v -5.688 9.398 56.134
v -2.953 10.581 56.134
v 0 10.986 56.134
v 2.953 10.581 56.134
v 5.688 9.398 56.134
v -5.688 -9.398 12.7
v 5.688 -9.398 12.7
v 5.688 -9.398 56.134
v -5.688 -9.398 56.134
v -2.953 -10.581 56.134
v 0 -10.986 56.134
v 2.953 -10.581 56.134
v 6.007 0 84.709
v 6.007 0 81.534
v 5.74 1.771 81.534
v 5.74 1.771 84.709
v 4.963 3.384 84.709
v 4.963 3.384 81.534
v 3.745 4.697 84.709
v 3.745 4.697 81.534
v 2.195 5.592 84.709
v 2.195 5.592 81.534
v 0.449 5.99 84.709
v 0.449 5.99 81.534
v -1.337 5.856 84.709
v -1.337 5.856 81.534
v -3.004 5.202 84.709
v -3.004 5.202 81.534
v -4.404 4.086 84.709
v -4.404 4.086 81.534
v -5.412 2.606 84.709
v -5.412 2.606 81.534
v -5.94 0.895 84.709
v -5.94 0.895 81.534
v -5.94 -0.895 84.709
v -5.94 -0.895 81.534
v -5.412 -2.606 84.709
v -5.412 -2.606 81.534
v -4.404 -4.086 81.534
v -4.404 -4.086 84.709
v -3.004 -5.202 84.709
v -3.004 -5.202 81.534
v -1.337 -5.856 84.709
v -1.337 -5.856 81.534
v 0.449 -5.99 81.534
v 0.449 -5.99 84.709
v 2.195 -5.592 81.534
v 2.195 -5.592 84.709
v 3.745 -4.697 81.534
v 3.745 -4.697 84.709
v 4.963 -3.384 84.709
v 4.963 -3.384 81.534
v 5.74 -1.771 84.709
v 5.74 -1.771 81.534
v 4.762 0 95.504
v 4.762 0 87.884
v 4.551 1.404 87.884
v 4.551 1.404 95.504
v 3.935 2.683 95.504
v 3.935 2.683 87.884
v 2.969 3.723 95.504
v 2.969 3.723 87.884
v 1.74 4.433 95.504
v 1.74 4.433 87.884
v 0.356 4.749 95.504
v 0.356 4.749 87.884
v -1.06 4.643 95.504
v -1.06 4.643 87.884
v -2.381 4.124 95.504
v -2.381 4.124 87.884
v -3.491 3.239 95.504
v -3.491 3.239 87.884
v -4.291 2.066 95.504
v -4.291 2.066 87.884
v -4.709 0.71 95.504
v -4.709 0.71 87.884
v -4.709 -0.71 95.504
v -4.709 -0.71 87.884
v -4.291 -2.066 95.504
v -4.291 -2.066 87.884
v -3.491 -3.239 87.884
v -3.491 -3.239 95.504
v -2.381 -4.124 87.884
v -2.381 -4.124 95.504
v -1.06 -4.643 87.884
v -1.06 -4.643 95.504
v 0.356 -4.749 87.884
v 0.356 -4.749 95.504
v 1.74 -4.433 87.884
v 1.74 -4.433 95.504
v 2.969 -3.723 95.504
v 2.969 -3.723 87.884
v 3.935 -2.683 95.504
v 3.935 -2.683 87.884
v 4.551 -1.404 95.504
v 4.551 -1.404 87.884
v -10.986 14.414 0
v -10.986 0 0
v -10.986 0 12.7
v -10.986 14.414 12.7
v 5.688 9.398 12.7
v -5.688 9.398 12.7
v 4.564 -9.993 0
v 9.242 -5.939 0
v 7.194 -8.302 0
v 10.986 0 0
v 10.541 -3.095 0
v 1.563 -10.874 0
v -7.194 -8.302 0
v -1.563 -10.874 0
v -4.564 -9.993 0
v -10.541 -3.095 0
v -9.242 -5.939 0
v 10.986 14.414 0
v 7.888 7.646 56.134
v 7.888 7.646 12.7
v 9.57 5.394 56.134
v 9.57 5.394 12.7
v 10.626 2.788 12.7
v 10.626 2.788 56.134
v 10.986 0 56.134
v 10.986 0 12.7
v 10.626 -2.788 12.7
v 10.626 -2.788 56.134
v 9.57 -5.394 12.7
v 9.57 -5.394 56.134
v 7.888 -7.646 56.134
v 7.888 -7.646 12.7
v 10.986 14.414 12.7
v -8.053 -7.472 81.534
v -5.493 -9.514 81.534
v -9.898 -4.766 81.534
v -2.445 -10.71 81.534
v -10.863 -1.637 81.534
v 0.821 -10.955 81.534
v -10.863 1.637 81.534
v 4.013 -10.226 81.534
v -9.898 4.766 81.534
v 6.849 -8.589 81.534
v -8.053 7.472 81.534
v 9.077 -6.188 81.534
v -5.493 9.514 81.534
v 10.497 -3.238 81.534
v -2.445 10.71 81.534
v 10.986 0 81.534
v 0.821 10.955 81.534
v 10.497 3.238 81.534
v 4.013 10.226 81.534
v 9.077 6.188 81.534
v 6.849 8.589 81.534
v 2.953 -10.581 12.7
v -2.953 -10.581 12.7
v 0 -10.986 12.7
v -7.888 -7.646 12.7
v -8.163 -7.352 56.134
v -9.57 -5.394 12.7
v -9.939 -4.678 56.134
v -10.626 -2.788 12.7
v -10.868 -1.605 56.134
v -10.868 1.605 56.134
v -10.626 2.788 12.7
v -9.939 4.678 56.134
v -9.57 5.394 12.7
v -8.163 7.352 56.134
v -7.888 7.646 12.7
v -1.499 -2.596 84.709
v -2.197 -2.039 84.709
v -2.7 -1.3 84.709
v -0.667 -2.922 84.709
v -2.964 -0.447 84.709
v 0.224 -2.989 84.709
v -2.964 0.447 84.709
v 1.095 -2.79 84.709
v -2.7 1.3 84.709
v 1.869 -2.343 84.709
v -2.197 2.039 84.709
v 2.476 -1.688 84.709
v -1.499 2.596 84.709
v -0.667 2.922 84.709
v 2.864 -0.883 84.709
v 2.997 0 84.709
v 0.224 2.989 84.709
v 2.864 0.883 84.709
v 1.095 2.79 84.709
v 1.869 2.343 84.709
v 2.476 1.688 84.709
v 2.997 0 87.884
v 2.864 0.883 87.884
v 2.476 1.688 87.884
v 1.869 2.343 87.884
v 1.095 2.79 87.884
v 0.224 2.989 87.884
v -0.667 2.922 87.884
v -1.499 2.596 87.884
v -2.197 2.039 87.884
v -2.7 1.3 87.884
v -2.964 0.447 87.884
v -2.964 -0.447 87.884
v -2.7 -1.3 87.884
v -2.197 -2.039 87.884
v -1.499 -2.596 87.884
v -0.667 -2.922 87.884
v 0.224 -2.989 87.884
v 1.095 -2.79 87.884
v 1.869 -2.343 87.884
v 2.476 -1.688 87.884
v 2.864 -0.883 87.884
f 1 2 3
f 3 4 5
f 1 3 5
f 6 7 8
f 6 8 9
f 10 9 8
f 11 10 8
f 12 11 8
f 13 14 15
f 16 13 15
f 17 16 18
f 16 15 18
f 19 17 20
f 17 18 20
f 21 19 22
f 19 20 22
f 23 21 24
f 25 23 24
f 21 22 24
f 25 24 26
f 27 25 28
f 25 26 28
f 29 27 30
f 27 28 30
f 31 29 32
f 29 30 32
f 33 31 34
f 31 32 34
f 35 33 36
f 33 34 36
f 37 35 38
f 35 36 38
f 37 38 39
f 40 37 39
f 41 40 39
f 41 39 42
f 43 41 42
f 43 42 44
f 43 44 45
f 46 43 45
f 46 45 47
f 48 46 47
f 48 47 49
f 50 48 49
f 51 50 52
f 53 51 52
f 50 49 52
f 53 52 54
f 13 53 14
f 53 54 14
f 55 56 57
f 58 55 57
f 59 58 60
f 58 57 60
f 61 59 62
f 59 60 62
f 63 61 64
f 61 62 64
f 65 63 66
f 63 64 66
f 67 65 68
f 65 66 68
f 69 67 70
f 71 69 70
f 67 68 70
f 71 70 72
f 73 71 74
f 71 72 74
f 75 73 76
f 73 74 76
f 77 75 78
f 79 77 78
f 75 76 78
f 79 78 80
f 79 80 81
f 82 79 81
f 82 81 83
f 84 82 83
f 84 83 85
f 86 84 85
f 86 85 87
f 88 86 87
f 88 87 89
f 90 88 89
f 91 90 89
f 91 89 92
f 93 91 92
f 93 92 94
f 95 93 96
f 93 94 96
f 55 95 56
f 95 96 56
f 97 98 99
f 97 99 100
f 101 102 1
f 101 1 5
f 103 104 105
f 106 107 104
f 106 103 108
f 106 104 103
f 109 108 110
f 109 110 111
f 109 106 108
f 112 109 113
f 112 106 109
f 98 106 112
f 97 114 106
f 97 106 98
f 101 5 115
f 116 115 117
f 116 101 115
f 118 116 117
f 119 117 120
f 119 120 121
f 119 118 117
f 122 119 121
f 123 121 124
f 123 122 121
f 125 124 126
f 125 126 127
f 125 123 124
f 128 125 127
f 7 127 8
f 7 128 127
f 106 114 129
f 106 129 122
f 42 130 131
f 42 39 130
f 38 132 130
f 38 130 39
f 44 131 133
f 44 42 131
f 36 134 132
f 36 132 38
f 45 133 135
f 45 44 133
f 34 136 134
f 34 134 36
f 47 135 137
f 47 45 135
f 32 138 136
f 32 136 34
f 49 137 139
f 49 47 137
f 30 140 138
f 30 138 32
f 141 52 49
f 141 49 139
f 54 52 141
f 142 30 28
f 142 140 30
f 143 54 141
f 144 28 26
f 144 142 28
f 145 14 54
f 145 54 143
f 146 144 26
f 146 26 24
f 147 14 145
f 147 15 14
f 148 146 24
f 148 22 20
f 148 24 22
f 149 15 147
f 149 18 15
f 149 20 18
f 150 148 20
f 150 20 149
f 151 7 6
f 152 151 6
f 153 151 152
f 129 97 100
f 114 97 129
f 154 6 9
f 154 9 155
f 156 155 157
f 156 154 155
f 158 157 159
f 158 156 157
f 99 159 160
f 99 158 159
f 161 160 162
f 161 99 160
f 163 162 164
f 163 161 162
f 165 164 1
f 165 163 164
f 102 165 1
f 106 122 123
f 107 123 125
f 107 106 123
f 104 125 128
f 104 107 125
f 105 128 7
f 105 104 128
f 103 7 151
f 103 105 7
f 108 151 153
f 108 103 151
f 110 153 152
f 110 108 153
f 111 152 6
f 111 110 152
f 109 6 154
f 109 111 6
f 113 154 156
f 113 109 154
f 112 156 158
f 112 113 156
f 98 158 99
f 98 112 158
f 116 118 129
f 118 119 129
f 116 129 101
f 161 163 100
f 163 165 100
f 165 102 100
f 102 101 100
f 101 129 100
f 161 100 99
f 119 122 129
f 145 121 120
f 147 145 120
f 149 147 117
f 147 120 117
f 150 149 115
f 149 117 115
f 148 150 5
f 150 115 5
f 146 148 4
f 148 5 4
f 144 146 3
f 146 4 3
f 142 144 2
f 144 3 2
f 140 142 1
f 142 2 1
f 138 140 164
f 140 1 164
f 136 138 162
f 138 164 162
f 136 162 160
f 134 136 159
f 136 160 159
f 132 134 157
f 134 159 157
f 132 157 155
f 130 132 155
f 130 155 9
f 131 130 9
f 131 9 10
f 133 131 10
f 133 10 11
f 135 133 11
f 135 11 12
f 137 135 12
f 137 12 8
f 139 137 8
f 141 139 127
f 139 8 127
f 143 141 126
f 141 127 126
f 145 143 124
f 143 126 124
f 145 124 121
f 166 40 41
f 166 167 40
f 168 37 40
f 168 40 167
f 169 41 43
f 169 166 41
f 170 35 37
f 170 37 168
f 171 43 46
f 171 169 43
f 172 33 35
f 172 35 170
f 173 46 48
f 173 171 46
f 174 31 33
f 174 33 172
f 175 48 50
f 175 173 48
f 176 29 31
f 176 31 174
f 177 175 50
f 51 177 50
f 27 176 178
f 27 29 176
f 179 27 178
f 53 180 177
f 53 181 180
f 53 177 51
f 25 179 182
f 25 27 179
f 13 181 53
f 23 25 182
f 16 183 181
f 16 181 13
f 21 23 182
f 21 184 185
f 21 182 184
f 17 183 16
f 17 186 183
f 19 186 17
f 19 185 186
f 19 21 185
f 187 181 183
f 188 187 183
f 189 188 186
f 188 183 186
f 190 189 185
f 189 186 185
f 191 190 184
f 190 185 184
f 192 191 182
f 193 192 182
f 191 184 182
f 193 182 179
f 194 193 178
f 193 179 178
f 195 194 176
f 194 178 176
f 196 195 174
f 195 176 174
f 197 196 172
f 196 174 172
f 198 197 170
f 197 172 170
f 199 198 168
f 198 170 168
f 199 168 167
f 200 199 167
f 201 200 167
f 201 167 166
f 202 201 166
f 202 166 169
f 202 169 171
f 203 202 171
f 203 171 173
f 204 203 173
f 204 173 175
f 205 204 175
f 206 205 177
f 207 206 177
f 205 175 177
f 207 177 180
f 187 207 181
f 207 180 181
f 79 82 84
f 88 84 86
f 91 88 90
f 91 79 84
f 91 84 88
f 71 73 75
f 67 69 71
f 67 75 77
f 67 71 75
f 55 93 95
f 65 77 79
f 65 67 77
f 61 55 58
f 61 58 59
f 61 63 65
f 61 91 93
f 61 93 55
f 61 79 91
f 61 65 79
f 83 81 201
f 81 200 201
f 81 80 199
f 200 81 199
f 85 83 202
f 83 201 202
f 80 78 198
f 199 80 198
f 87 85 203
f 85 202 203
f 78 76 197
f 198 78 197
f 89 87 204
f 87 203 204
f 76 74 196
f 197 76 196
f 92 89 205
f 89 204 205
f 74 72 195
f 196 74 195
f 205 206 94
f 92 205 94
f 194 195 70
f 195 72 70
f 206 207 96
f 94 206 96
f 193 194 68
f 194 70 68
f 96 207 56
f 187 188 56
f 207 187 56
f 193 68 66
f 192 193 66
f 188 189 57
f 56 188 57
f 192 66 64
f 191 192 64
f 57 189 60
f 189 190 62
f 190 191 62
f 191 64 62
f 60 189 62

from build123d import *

# Parameters (mm, degrees)
BOSS_EXTRUDE1_DEPTH = 12.7
BOSS_EXTRUDE2_DEPTH = 43.434
SKETCH3_R           = 10.9855
BOSS_EXTRUDE3_DEPTH = 25.4
SKETCH4_R           = 6.0071
BOSS_EXTRUDE4_DEPTH = 3.175
SKETCH5_R           = 2.9972
BOSS_EXTRUDE5_DEPTH = 3.175
SKETCH6_R           = 4.7625
BOSS_EXTRUDE6_DEPTH = 7.62


with BuildPart() as part:
    # Sketch1 → Boss-Extrude1 (new body)
    with BuildSketch(Plane.XY):
        with BuildLine():
            Line((-10.9855, 0), (-10.9855, 14.4145))
            Line((-10.9855, 14.4145), (10.9855, 14.4145))
            Line((10.9855, 14.4145), (10.9855, 0))
            ThreePointArc((10.9855, 0), (0, -10.9855), (-10.9855, 0))
        make_face()
    extrude(amount=BOSS_EXTRUDE1_DEPTH)

    # Sketch2 → Boss-Extrude2 (add)
    with BuildSketch(Plane.XY.offset(12.7)):
        with BuildLine():
            Line((-5.68848, 9.398), (5.68848, 9.398))
            ThreePointArc((5.68848, 9.398), (10.9855, 0), (5.68848, -9.398))
            Line((5.68848, -9.398), (-5.68848, -9.398))
            ThreePointArc((-5.68848, -9.398), (-10.9855, 0), (-5.68848, 9.398))
        make_face()
    extrude(amount=BOSS_EXTRUDE2_DEPTH)

    # Sketch3 → Boss-Extrude3 (add)
    with BuildSketch(Plane.XY.offset(56.134)):
        Circle(SKETCH3_R)
    extrude(amount=BOSS_EXTRUDE3_DEPTH)

    # Sketch4 → Boss-Extrude4 (add)
    with BuildSketch(Plane.XY.offset(81.534)):
        Circle(SKETCH4_R)
    extrude(amount=BOSS_EXTRUDE4_DEPTH)

    # Sketch5 → Boss-Extrude5 (add)
    with BuildSketch(Plane.XY.offset(84.709)):
        Circle(SKETCH5_R)
    extrude(amount=BOSS_EXTRUDE5_DEPTH)

    # Sketch6 → Boss-Extrude6 (add)
    with BuildSketch(Plane.XY.offset(87.884)):
        Circle(SKETCH6_R)
    extrude(amount=BOSS_EXTRUDE6_DEPTH)


solid = part.part
